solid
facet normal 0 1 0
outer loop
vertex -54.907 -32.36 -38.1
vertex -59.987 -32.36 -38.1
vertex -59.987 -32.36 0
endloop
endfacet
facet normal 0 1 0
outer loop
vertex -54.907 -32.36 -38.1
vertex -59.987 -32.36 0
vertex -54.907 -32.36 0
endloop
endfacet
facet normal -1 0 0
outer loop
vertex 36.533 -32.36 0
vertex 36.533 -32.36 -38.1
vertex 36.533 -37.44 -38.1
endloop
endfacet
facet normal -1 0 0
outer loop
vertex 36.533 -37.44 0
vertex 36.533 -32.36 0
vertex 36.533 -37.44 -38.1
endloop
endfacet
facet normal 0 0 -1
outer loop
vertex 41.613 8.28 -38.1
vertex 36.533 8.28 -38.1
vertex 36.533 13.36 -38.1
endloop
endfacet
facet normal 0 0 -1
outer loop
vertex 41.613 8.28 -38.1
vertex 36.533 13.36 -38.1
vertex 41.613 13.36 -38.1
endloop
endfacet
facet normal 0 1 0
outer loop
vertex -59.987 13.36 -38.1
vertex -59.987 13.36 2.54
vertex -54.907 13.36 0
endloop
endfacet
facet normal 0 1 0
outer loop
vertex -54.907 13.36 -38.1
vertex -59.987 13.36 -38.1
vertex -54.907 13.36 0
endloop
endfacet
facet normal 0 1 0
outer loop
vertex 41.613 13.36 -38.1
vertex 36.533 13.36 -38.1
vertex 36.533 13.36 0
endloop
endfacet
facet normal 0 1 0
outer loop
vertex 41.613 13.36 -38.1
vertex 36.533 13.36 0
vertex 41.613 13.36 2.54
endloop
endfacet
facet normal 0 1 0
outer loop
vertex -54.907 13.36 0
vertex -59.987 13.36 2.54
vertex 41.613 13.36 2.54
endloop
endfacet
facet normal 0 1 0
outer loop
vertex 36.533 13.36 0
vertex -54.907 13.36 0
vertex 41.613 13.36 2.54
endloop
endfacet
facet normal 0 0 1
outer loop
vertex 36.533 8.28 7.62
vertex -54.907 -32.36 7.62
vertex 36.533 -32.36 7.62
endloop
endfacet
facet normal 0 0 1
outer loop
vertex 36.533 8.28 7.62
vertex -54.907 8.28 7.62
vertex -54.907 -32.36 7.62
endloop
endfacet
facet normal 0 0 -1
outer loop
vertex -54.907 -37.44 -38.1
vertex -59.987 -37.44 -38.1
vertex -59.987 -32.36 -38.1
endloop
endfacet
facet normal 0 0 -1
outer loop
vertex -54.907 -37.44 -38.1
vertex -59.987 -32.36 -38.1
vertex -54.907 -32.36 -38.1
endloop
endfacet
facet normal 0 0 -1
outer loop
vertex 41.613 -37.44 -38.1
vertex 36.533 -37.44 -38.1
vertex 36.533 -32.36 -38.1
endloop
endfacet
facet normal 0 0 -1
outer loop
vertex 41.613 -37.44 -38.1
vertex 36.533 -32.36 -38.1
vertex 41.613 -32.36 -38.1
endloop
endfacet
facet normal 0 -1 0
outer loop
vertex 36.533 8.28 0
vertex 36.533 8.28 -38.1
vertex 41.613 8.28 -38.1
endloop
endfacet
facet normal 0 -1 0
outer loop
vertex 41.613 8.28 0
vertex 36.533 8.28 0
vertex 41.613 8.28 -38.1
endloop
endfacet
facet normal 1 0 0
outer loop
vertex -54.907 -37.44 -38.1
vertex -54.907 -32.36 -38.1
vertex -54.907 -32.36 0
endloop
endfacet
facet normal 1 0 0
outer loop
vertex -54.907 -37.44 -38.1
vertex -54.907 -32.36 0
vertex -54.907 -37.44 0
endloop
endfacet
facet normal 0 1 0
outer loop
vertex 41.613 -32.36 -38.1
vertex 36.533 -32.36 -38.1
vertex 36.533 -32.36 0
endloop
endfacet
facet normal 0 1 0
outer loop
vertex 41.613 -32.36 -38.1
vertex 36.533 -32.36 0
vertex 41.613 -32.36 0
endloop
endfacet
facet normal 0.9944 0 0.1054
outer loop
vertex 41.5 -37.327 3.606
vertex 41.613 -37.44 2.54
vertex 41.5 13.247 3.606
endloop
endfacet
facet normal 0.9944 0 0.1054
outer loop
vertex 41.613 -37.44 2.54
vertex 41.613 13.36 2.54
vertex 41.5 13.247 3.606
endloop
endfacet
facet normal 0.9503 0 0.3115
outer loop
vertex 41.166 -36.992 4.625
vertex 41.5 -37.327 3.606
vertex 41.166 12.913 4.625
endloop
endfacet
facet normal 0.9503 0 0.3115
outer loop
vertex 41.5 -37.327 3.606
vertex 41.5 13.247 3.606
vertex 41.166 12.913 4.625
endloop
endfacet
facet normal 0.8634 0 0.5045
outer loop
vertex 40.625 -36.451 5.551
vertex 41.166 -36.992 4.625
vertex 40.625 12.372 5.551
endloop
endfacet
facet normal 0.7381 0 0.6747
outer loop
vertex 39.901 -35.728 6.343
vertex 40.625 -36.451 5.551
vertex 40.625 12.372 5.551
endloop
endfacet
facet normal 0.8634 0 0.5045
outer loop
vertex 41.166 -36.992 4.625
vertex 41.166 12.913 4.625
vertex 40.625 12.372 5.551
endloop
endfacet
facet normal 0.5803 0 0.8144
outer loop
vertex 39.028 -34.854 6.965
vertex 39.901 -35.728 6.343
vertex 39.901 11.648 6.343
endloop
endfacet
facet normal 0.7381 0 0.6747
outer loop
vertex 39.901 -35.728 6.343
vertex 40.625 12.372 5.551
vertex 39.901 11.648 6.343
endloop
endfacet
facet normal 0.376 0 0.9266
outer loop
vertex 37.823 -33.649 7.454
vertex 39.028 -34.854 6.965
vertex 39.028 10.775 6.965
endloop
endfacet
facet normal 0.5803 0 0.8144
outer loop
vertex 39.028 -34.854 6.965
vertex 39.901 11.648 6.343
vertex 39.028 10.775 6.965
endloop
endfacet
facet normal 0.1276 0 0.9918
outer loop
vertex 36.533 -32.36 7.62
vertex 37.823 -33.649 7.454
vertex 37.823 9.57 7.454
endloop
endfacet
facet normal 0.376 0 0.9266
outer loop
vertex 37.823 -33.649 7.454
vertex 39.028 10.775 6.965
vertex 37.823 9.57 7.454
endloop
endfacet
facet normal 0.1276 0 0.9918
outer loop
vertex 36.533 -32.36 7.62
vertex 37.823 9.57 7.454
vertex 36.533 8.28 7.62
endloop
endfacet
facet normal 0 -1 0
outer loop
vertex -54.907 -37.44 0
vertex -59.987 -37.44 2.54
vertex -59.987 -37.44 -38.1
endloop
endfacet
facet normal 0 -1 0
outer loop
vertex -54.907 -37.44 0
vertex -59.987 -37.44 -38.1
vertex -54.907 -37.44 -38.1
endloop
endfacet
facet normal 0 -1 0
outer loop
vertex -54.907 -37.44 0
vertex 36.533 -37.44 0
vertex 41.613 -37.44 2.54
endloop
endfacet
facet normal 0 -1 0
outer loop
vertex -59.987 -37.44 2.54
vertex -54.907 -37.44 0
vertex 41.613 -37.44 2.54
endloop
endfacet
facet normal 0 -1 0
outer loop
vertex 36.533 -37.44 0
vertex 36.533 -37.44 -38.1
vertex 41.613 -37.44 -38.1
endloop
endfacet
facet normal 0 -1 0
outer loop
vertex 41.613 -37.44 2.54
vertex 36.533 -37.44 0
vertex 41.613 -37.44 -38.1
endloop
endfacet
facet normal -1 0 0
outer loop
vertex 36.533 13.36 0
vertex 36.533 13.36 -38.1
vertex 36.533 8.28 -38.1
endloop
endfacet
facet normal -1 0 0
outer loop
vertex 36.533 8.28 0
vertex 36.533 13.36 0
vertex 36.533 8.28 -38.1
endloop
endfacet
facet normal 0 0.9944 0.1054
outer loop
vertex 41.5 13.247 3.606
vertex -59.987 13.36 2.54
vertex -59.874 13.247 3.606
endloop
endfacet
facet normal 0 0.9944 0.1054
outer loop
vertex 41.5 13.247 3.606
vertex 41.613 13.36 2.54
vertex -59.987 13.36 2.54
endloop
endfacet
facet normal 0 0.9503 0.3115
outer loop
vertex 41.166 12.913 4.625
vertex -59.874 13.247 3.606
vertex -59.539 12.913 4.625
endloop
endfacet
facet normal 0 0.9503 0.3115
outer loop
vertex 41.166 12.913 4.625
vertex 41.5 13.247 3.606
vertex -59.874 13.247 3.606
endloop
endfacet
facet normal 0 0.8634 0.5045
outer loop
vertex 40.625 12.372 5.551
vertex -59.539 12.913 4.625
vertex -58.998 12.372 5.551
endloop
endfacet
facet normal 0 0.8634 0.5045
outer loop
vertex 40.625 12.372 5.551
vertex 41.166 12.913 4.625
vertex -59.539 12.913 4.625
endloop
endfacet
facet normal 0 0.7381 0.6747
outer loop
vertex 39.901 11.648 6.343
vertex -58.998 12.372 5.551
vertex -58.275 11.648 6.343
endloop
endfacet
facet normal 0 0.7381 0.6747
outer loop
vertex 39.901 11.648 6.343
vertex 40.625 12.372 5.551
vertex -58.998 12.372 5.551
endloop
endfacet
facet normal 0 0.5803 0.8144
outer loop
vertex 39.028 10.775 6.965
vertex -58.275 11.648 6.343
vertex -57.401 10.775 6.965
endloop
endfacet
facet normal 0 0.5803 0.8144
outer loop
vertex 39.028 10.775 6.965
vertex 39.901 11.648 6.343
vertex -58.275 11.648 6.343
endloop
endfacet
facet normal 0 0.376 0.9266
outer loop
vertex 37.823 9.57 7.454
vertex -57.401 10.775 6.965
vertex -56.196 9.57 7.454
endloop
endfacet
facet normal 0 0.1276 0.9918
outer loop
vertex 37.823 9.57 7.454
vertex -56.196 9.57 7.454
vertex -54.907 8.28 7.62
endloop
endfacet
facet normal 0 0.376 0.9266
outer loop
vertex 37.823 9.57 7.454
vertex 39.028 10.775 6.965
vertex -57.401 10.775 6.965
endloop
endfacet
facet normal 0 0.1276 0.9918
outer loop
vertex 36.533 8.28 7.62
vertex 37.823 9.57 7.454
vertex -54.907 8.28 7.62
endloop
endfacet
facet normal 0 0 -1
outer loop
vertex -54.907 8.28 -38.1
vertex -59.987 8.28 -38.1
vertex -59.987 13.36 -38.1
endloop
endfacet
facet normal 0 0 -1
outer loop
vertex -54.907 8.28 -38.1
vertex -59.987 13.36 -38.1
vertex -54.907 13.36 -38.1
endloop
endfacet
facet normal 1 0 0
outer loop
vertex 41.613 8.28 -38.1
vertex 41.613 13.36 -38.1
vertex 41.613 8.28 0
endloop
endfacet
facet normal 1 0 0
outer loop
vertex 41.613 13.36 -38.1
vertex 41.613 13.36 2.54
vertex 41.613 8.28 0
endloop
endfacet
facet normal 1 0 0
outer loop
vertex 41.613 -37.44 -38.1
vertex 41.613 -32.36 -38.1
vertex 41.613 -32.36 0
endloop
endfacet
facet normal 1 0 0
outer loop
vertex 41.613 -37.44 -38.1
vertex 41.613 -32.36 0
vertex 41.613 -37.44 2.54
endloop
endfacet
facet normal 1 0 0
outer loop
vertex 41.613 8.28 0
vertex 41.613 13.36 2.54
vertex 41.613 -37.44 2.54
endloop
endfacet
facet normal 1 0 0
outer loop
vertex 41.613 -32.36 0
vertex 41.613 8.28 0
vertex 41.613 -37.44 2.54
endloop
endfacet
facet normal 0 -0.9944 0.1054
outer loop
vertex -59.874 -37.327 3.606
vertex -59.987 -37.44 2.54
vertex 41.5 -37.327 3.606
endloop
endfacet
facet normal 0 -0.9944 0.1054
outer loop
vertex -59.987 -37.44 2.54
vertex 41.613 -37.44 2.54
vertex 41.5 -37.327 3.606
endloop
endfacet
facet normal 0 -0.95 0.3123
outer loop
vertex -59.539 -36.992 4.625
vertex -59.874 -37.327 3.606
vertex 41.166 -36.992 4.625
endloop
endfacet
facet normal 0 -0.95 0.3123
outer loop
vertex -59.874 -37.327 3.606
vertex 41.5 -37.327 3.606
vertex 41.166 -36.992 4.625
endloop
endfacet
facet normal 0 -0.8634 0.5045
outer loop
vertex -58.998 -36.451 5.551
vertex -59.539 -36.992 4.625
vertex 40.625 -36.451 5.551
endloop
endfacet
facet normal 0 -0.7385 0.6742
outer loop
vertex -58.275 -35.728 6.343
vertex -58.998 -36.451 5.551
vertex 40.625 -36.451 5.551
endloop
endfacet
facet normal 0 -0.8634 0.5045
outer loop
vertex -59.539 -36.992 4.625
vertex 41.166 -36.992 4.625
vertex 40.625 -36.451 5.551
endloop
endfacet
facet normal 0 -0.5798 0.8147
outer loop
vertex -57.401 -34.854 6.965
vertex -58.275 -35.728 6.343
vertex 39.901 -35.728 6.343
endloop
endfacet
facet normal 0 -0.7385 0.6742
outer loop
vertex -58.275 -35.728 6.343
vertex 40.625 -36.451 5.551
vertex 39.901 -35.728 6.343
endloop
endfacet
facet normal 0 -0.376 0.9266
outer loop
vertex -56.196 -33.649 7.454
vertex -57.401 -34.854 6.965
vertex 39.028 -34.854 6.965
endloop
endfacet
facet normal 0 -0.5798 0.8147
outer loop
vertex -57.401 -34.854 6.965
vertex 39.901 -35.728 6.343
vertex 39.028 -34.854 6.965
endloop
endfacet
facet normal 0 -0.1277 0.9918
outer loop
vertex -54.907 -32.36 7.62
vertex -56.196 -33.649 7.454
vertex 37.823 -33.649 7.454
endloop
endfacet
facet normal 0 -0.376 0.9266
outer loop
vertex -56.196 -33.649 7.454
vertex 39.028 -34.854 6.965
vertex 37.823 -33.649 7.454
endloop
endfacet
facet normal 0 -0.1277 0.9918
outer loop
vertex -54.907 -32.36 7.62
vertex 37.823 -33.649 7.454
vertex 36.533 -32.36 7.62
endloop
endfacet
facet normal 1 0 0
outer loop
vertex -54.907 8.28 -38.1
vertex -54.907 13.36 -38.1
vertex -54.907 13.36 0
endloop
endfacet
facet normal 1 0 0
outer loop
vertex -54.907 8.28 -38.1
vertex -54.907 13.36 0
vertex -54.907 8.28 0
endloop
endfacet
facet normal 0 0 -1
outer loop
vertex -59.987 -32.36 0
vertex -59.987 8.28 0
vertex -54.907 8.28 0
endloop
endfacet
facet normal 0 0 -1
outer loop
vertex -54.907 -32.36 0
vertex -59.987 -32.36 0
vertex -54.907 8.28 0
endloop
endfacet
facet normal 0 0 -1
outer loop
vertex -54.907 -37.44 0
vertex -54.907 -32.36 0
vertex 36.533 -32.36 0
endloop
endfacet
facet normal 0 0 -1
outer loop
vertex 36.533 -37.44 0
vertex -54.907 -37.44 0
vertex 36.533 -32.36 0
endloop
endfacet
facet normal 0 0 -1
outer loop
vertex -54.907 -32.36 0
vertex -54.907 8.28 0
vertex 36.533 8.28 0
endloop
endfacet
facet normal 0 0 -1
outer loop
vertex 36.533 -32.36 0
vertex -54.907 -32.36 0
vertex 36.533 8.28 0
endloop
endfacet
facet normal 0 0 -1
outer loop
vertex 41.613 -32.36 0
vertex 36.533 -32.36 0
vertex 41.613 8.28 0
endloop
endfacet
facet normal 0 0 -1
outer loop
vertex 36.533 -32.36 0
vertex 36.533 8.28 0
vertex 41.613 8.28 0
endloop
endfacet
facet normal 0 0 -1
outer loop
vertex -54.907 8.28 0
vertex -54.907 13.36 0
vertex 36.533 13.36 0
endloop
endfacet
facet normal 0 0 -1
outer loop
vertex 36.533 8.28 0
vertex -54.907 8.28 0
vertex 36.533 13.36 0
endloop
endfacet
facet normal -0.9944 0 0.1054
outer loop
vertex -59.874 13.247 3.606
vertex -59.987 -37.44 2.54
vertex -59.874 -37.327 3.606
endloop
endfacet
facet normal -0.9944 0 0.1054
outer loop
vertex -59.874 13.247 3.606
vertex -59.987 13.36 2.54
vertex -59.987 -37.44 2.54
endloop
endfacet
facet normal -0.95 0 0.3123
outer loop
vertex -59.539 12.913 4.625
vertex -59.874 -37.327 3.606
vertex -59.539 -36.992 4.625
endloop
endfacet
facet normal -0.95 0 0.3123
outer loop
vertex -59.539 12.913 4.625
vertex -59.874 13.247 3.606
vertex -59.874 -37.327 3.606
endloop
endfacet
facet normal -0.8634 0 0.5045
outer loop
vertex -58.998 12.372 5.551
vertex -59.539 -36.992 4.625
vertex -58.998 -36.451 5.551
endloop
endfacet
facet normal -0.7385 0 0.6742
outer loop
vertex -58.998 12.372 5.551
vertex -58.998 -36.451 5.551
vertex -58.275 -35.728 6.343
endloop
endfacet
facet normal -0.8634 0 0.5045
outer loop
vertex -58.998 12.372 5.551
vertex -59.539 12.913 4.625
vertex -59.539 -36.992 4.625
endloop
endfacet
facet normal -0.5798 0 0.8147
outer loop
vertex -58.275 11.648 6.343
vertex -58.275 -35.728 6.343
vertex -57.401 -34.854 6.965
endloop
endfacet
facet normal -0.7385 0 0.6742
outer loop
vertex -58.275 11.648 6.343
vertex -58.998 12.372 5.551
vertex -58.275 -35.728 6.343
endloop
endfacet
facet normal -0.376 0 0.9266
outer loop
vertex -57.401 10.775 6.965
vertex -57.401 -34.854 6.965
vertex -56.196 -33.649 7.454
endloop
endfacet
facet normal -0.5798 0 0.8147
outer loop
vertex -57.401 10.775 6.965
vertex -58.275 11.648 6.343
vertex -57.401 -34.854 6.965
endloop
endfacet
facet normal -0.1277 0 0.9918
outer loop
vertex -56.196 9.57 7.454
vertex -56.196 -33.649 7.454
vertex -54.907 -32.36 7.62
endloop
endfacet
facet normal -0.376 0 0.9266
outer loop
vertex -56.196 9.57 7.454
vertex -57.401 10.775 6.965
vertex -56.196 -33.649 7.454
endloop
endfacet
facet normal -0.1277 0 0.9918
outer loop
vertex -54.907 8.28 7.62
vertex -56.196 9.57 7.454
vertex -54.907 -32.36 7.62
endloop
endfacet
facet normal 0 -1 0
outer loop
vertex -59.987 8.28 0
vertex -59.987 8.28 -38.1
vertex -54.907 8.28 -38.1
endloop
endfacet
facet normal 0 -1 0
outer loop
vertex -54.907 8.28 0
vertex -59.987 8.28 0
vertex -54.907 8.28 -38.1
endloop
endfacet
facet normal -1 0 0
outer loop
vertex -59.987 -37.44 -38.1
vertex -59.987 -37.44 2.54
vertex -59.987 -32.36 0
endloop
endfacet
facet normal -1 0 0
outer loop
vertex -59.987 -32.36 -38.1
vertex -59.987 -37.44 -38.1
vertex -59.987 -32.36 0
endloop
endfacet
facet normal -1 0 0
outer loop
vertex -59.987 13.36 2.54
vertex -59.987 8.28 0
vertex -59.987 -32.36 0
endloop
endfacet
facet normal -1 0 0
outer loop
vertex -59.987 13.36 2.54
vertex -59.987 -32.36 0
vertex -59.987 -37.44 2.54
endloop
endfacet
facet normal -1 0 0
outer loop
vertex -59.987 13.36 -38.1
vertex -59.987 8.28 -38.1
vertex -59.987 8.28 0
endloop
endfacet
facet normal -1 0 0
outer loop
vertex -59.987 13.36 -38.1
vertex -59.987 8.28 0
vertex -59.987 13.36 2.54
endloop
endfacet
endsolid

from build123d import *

# Parameters (mm, degrees)
F0_W     = 101.6
F0_H     = 50.8
F1_DEPTH = 7.62
F2_R     = 5.08
F3_W     = 5.08
F3_H     = 5.08
F4_DEPTH = 38.1


with BuildPart() as f1:
    # F0 (on Top) → F1 (new body)
    with BuildSketch(Plane.XY):
        with Locations((-9.186735, -12.039736)):
            Rectangle(F0_W, F0_H)
    extrude(amount=F1_DEPTH)

    # F2
    f2_edges = [f1.edges().sort_by_distance(p)[0] for p in [
        (-9.186735, -37.439736, 7.62),
        (-59.986735, -12.039736, 7.62),
        (-9.186735, 13.360264, 7.62),
        (41.613265, -12.039736, 7.62),
    ]]
    fillet(f2_edges, radius=F2_R)

    # F3 (on face) → F4 (join)
    with BuildSketch(Plane(origin=(0, 0, 0), x_dir=(1, 0, 0), z_dir=(0, 0, -1))):
        with Locations((39.073265, -10.820264)):
            Rectangle(F3_W, F3_H)
        with Locations((39.073265, 34.899736)):
            Rectangle(F3_W, F3_H)
        with Locations((-57.446735, -10.820264)):
            Rectangle(F3_W, F3_H)
        with Locations((-57.446735, 34.899736)):
            Rectangle(F3_W, F3_H)
    extrude(amount=F4_DEPTH)


solid = f1.part
